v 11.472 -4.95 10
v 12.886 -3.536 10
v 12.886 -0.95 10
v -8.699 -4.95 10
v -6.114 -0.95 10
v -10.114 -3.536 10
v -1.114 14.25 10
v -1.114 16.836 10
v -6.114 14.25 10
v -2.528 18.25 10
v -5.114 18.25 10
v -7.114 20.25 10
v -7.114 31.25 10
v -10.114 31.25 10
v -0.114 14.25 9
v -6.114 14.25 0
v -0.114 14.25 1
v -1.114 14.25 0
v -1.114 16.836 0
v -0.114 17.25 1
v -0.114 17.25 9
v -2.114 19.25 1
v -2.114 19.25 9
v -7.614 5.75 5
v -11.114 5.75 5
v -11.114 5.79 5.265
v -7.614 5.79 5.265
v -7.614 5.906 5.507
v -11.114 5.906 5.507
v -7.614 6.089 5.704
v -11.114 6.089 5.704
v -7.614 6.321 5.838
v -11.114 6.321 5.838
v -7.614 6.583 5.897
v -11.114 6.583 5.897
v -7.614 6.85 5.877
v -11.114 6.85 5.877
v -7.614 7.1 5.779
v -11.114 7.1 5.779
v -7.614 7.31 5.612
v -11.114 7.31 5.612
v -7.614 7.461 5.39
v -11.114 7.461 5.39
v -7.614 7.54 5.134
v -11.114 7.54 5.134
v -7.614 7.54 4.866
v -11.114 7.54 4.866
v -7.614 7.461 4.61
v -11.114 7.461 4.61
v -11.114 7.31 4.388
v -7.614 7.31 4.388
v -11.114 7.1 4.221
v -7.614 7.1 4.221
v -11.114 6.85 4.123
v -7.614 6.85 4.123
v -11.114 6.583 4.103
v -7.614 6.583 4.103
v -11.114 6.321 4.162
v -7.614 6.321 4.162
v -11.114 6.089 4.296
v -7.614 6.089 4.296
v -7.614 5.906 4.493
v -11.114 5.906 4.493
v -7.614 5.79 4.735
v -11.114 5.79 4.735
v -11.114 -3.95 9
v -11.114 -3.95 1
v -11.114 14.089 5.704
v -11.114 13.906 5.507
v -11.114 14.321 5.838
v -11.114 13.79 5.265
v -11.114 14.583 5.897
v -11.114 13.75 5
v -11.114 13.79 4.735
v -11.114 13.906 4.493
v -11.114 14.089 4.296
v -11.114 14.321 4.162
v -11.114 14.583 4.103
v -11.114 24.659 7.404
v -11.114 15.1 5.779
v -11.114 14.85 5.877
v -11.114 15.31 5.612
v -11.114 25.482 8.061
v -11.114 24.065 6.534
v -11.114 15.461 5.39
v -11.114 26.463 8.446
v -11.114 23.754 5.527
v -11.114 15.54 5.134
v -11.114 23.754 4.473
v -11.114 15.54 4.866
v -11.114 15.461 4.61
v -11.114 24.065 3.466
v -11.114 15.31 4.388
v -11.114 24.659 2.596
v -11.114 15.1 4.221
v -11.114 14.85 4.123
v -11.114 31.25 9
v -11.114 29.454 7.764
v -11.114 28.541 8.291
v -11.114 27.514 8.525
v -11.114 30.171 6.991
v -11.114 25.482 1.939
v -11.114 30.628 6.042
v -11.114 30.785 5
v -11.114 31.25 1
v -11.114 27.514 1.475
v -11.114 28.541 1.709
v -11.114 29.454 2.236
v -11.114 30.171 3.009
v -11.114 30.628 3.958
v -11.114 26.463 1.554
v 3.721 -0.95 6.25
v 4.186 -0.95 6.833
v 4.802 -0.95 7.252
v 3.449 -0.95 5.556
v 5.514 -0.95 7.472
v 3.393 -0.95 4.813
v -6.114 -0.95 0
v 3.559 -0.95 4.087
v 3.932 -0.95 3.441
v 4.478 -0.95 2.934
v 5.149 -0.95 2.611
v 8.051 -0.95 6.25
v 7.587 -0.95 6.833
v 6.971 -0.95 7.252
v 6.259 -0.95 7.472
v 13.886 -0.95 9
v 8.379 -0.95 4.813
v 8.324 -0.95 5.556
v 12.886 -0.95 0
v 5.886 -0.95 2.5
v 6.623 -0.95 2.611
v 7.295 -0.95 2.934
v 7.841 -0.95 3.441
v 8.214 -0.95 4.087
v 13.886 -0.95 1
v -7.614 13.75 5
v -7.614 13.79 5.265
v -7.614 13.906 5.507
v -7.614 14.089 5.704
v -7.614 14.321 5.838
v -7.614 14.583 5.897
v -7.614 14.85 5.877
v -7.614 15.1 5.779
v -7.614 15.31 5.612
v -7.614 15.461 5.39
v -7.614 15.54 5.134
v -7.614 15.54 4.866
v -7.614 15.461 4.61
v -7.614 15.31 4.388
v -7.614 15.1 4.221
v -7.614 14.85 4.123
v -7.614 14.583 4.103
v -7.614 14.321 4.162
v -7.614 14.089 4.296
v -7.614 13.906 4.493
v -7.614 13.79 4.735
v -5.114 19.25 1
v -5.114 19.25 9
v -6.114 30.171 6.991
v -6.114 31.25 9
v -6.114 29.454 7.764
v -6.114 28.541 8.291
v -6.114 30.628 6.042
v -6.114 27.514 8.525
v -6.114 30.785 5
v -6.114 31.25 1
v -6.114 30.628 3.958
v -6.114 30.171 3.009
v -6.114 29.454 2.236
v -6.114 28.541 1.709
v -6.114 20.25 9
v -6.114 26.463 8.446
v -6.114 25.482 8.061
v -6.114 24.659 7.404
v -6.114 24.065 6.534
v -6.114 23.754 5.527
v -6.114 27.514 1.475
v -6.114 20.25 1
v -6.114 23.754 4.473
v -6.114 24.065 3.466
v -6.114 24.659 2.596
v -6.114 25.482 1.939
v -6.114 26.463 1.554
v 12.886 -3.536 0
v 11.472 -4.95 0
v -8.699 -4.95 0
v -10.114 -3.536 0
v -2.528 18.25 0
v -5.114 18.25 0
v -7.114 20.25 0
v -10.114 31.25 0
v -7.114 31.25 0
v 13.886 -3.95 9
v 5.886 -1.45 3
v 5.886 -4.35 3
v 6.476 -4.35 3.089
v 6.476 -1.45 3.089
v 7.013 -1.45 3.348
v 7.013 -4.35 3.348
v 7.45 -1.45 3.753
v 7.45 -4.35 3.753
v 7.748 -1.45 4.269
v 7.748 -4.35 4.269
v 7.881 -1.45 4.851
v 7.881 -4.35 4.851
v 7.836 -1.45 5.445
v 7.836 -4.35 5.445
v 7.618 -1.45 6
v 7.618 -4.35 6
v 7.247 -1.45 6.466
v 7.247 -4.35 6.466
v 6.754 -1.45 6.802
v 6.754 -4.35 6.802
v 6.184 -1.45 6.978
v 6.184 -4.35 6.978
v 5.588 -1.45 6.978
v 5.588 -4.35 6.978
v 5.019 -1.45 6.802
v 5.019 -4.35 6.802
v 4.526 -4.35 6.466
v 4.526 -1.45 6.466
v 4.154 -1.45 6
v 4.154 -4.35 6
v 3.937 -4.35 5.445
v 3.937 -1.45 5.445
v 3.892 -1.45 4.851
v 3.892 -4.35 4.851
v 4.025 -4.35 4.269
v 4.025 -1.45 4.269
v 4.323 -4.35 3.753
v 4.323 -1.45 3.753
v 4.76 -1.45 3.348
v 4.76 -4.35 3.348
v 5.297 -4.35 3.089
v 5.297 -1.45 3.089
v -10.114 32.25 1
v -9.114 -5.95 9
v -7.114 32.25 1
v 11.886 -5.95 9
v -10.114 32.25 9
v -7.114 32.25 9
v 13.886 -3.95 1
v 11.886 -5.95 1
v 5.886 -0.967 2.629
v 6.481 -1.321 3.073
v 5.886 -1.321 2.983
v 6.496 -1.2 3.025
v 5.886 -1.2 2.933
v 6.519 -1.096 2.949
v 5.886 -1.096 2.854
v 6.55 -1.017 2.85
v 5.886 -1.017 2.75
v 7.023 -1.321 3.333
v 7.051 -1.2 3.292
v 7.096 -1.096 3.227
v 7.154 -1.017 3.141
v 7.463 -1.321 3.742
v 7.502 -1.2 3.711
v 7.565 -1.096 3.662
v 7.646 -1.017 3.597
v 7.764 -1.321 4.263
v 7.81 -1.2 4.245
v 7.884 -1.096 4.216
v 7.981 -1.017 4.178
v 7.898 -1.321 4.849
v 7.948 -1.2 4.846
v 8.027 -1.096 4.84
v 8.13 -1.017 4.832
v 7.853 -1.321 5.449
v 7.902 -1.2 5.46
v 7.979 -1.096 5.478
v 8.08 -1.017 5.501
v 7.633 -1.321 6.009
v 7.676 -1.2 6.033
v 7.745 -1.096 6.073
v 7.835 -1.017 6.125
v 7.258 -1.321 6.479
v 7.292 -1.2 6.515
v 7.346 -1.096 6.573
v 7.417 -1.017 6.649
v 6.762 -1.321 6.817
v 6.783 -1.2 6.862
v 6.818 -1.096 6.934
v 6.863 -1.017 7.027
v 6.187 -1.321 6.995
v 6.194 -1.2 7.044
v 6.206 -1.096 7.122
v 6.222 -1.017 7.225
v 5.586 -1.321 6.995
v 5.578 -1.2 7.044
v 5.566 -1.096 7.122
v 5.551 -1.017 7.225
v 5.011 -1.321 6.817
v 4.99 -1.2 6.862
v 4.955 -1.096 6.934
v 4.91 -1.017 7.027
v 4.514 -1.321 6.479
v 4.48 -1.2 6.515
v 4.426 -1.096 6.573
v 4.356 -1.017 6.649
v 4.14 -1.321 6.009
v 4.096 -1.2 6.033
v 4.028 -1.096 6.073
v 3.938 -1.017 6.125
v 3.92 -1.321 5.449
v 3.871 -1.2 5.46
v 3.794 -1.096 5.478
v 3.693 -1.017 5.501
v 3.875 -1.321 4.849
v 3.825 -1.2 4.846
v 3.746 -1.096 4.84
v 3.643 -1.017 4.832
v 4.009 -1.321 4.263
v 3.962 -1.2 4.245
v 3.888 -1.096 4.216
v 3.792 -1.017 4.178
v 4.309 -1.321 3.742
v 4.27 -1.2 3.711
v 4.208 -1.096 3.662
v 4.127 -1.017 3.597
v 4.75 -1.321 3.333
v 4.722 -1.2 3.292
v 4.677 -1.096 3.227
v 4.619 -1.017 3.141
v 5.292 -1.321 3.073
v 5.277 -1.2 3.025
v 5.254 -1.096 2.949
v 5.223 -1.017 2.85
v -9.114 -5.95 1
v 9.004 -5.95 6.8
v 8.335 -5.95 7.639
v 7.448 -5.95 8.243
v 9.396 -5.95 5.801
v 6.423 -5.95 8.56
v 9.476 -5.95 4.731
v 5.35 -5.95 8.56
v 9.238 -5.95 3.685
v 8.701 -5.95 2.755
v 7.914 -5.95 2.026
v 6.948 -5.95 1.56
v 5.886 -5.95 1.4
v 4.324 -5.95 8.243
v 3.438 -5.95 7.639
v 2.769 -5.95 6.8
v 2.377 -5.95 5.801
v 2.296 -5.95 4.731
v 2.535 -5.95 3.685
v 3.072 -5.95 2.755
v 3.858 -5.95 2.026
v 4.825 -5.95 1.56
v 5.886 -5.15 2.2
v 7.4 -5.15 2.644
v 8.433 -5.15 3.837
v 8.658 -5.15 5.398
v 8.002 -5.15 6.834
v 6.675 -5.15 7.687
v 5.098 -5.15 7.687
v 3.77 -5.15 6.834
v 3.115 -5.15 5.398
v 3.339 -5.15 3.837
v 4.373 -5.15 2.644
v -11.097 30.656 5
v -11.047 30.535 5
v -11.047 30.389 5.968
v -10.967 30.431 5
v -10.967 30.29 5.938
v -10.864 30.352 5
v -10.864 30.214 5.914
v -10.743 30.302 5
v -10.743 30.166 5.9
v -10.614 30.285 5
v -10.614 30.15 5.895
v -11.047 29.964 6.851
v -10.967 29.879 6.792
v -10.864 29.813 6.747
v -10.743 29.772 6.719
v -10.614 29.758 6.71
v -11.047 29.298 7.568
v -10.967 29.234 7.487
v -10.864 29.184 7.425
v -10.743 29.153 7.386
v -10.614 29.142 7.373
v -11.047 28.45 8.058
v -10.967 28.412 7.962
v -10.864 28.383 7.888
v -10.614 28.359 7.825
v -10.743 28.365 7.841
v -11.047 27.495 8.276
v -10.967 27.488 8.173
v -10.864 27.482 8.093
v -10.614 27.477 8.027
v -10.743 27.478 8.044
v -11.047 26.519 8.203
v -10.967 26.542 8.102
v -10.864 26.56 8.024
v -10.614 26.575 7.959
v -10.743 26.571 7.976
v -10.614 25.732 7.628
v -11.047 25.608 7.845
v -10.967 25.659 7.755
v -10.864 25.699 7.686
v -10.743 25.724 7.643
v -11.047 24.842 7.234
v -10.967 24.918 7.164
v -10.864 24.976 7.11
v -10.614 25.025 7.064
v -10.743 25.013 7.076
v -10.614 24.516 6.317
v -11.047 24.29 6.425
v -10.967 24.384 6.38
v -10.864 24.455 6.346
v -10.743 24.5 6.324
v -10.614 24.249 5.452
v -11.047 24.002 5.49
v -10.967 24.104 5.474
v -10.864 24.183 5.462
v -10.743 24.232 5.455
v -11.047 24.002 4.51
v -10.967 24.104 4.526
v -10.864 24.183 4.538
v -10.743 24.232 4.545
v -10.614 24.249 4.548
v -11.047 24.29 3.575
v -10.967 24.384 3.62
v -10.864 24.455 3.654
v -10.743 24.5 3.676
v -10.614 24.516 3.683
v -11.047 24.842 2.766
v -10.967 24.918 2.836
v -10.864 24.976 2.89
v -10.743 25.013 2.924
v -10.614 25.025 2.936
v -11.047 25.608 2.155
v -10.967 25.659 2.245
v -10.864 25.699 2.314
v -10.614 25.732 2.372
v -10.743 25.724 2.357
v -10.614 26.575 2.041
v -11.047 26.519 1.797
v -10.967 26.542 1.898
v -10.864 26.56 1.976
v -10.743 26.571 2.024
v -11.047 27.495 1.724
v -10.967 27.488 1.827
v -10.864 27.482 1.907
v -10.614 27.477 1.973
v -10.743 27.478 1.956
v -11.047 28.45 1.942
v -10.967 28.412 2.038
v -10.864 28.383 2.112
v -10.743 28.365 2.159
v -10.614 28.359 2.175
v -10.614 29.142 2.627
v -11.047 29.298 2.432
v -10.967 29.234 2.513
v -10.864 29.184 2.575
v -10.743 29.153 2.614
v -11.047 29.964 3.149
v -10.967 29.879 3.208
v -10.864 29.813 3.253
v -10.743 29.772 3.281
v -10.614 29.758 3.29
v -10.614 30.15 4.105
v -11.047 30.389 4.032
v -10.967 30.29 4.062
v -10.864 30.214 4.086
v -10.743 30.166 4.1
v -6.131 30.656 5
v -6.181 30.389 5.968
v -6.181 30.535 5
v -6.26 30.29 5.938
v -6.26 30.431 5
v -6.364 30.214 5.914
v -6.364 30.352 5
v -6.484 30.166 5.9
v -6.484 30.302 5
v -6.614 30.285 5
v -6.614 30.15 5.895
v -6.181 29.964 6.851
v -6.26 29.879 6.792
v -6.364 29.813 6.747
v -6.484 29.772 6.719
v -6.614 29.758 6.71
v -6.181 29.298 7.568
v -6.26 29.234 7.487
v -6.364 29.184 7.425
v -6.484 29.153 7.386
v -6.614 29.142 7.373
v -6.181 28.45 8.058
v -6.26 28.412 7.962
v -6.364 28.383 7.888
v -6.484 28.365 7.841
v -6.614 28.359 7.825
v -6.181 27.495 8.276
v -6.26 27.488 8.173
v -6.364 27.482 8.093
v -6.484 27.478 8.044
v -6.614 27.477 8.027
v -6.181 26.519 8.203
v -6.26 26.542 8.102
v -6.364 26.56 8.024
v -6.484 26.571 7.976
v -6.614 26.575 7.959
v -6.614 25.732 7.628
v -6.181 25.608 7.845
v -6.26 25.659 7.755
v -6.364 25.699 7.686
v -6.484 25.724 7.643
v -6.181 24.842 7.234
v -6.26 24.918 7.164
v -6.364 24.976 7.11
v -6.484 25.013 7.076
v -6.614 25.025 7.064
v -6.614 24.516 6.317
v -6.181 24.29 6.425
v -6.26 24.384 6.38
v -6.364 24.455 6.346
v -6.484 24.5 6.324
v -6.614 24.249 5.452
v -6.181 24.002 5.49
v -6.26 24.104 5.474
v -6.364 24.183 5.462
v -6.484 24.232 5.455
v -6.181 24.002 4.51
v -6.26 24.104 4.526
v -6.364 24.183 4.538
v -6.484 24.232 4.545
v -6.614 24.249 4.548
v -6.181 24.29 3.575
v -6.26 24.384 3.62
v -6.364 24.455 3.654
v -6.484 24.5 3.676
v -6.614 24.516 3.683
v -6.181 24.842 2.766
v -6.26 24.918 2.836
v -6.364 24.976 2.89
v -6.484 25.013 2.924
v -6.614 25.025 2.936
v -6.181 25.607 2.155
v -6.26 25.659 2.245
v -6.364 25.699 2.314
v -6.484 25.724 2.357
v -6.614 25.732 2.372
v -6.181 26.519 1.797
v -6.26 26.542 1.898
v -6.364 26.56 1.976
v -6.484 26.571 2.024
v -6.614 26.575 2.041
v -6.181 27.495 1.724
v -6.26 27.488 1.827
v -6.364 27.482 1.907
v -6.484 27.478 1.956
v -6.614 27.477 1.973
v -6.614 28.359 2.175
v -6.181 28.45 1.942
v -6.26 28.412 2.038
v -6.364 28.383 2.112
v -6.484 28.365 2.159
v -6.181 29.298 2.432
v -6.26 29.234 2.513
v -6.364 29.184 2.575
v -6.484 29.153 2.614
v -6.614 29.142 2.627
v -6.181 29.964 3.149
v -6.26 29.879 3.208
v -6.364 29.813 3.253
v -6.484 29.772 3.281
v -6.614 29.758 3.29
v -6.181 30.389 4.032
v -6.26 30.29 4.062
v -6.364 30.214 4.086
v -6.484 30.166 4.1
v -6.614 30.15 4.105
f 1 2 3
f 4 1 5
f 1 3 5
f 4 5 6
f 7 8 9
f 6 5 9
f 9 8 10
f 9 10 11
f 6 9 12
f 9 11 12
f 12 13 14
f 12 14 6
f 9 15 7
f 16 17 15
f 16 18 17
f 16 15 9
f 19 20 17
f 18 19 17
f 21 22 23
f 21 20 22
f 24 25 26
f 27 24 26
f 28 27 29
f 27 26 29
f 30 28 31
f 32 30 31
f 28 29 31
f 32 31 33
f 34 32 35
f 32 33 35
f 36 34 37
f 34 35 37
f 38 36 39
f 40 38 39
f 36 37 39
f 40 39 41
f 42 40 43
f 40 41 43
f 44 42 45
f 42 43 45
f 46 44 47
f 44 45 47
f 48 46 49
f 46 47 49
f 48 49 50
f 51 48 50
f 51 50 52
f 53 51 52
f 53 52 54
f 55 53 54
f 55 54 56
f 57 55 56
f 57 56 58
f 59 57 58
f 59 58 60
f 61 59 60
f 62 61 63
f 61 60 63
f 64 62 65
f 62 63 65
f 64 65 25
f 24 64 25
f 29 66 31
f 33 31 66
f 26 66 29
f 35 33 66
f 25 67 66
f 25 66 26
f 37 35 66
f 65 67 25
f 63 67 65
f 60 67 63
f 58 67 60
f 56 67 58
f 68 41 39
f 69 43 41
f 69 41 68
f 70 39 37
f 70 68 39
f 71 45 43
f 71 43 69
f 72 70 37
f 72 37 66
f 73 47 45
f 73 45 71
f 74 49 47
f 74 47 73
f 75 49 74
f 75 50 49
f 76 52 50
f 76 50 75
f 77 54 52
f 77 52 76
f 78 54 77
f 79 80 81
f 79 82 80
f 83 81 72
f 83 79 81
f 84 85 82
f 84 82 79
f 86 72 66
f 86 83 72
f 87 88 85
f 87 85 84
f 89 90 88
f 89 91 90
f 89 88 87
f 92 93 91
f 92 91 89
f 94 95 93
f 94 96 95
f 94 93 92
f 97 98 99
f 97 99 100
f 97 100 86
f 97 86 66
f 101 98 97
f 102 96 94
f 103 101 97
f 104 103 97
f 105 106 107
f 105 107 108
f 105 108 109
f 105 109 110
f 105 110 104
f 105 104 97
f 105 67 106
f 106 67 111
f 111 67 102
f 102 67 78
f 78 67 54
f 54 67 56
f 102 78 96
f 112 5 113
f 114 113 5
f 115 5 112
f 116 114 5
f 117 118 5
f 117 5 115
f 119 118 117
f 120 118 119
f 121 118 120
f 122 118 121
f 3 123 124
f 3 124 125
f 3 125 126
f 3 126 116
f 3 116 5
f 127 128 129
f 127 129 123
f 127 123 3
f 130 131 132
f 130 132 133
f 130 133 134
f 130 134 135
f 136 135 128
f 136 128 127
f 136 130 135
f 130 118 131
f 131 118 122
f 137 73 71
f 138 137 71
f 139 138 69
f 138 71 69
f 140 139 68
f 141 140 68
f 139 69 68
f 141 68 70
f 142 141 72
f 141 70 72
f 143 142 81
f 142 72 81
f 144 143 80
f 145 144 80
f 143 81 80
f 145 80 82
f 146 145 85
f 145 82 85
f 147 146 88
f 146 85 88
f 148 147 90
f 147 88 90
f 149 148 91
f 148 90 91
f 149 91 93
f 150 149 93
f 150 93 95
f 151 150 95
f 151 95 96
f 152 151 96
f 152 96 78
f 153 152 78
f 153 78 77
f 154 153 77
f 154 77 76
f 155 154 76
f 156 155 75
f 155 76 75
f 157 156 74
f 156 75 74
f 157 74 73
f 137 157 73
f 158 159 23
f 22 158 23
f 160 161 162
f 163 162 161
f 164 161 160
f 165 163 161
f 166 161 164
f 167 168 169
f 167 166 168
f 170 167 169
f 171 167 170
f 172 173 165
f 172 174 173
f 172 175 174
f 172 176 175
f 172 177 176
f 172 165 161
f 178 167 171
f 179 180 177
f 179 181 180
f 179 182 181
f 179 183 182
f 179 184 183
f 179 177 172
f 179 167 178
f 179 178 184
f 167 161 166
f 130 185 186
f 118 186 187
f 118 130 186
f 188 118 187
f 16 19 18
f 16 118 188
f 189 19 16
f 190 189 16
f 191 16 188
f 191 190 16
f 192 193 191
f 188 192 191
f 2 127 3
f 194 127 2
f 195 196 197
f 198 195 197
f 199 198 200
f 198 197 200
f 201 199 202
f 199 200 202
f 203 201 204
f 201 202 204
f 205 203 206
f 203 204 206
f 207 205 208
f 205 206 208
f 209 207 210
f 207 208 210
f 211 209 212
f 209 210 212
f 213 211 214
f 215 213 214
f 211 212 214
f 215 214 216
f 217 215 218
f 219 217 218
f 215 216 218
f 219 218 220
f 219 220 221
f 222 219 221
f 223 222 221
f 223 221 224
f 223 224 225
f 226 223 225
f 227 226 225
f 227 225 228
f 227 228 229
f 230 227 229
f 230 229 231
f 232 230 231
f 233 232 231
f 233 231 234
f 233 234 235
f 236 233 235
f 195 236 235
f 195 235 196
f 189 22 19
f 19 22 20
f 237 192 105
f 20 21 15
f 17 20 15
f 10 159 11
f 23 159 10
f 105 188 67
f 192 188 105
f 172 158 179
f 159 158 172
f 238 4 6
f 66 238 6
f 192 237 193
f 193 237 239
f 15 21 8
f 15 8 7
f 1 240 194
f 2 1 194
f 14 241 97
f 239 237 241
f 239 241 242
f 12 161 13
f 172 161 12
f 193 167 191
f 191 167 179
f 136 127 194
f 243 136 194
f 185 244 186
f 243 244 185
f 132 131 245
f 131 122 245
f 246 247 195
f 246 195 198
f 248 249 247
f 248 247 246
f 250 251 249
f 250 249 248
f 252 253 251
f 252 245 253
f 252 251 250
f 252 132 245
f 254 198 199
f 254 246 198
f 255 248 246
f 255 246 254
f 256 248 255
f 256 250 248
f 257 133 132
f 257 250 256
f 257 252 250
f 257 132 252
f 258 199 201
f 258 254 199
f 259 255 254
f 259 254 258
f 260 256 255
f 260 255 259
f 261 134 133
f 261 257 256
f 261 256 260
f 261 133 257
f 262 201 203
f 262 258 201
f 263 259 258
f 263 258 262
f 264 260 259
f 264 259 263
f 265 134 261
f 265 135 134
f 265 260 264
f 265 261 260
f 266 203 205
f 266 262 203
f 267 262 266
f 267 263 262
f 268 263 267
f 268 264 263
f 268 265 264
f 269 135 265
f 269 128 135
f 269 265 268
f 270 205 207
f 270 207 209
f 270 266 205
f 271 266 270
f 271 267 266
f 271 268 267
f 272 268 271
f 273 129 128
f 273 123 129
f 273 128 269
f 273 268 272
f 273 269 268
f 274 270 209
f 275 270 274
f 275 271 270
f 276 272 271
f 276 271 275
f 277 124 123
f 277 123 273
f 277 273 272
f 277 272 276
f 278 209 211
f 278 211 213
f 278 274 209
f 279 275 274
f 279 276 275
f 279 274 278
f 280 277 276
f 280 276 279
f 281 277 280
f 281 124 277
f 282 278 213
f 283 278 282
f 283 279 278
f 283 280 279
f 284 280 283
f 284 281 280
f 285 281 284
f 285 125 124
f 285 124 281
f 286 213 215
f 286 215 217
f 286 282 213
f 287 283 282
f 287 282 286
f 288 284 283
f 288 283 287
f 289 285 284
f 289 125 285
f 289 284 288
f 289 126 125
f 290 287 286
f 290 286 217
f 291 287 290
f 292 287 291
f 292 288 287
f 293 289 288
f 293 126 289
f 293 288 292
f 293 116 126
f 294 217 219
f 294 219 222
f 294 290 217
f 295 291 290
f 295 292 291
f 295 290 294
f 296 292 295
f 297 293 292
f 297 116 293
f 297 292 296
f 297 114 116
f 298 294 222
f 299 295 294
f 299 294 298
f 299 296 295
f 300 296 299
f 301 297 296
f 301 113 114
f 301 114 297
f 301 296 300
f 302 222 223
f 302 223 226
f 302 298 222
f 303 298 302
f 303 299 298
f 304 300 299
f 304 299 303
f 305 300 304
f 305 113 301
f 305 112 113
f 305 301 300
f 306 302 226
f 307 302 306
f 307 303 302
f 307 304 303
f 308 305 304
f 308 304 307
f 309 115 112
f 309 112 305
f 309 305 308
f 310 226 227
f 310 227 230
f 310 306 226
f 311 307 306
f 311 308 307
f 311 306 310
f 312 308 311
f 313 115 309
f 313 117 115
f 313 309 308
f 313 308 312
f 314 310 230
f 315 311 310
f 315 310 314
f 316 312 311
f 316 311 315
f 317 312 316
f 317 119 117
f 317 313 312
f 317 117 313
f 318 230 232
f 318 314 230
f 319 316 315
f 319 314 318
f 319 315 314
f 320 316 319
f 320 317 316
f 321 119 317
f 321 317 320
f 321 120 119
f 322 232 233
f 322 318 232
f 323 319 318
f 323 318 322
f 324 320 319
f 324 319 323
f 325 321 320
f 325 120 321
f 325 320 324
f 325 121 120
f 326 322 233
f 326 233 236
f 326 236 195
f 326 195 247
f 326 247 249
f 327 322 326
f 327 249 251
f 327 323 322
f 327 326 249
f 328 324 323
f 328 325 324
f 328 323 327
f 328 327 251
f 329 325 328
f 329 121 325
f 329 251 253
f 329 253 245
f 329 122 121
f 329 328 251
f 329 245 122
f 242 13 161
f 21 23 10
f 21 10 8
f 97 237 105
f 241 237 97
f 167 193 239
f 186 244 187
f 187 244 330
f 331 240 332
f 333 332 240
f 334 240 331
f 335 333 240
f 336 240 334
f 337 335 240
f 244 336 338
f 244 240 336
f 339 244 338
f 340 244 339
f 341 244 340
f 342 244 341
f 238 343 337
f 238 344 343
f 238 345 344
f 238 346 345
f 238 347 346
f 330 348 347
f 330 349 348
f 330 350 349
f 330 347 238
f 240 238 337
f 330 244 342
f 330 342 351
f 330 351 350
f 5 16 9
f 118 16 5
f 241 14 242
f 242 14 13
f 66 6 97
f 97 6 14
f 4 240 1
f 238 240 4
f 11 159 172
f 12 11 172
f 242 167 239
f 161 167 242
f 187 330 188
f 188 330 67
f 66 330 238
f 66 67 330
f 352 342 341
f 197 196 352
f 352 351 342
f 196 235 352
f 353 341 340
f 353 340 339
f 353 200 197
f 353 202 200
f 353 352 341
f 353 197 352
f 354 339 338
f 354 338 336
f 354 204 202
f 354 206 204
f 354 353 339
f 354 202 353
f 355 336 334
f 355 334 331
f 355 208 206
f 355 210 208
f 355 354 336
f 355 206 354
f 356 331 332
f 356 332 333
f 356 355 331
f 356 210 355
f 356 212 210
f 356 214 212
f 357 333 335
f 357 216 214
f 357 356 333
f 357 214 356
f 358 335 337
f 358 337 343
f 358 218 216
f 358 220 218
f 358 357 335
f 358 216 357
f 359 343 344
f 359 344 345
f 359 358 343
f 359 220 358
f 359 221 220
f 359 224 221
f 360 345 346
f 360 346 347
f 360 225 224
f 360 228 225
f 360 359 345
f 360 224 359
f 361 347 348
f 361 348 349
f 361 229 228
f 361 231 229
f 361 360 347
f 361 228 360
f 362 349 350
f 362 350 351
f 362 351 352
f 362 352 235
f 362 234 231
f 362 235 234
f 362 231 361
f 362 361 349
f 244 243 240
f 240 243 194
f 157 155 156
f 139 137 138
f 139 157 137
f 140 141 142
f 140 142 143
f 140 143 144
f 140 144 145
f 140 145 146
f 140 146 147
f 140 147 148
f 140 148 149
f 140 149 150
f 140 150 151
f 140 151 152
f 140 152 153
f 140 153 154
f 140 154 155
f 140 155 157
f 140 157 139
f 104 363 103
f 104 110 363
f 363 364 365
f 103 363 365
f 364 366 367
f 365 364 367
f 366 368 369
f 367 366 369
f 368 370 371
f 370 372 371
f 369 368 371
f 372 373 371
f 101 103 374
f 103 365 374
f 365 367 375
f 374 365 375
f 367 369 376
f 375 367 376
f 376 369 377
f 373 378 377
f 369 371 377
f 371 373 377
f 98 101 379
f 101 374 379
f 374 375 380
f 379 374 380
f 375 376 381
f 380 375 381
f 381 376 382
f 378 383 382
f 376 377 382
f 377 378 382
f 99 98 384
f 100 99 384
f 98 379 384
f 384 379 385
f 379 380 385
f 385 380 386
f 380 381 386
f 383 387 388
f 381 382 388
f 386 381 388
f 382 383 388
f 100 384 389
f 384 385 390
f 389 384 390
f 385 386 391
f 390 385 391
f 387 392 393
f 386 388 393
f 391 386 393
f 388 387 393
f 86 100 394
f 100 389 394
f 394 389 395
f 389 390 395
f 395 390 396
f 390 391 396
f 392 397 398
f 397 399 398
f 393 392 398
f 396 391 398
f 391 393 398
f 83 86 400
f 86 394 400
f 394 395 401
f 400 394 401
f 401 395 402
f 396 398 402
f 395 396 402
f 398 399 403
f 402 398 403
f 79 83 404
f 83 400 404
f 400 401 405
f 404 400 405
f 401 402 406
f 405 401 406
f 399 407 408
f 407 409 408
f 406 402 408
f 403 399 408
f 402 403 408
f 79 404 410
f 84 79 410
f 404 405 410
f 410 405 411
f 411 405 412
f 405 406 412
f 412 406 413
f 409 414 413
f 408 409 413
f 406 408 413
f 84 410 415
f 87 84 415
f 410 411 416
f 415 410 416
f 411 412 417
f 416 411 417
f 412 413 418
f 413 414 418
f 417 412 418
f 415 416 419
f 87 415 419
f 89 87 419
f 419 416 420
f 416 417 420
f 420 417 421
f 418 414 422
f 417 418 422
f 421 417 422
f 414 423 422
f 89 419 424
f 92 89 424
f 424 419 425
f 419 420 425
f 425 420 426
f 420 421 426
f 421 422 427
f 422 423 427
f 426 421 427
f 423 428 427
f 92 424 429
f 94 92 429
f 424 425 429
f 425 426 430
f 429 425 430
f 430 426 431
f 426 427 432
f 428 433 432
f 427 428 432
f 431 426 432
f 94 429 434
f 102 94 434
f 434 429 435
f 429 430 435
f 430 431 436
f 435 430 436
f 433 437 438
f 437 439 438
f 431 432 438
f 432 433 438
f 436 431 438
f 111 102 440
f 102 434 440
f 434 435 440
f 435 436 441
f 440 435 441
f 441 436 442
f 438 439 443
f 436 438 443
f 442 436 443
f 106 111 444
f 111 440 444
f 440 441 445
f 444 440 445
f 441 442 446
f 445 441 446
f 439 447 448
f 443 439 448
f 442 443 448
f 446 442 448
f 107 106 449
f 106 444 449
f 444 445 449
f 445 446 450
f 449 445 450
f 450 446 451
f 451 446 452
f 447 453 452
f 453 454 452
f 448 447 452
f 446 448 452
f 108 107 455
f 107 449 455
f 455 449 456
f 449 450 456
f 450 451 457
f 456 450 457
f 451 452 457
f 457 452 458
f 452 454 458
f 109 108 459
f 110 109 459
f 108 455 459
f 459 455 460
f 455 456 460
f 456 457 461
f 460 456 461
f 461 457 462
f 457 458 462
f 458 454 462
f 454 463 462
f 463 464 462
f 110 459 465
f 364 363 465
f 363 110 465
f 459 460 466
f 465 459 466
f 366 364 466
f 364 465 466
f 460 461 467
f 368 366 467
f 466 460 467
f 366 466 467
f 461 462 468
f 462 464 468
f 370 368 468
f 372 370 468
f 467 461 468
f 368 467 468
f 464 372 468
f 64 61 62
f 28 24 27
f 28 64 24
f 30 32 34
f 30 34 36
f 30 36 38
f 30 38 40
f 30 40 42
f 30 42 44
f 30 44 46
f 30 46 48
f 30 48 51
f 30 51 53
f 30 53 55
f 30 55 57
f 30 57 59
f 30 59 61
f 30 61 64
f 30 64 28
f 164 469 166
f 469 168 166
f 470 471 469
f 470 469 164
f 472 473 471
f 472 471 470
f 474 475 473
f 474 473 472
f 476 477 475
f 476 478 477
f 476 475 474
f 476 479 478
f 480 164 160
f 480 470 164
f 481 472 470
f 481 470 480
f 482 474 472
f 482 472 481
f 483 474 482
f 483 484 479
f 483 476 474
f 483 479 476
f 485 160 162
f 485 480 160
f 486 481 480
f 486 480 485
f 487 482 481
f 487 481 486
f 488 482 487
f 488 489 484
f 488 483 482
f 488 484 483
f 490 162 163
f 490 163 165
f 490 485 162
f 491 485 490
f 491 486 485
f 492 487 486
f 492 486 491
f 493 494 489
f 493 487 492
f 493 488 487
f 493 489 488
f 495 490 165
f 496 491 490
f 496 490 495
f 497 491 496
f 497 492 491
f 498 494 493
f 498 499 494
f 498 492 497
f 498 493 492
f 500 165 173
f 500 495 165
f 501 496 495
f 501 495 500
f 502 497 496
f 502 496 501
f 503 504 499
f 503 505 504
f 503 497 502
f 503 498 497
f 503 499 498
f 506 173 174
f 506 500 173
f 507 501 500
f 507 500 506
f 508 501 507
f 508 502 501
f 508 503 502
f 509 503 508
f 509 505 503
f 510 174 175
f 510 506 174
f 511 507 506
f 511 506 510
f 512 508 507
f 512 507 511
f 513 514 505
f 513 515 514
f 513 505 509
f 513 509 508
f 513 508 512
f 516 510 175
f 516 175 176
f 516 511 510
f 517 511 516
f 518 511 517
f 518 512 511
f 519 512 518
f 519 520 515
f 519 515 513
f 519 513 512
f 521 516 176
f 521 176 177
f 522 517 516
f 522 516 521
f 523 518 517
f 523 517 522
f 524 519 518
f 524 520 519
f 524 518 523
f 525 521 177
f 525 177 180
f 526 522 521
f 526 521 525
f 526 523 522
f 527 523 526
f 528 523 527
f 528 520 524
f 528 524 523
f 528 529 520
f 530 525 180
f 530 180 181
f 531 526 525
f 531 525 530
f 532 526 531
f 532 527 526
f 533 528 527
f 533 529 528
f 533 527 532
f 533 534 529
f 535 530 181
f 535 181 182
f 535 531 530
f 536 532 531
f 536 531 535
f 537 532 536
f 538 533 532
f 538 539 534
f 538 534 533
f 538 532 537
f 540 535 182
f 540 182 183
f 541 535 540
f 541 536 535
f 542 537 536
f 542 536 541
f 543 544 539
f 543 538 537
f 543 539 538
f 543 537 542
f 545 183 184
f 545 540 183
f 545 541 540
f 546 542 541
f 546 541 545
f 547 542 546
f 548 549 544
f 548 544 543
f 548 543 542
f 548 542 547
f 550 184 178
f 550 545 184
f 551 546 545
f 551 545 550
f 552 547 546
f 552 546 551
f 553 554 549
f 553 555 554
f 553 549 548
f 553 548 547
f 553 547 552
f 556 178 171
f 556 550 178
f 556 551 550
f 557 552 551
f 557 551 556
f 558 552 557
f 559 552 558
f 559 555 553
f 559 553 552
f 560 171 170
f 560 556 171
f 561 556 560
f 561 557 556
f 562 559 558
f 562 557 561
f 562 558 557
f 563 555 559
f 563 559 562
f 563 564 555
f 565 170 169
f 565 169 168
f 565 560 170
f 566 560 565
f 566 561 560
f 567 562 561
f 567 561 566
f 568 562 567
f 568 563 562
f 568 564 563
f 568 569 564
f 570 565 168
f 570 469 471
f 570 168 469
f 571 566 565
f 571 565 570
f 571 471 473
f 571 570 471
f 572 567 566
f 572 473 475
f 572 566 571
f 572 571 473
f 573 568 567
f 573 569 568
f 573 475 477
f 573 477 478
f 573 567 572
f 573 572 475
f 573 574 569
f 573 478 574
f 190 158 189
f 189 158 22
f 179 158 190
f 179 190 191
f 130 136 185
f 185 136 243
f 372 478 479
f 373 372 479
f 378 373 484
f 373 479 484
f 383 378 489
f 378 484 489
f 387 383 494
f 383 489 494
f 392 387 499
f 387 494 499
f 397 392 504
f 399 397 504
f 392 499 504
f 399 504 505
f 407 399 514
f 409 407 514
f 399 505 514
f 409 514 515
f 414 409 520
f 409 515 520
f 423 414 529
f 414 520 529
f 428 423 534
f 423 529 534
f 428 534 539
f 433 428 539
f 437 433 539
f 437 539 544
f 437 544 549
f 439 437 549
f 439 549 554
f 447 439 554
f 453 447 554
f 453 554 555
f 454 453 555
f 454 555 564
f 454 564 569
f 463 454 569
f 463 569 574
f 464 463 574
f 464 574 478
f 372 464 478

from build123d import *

# Parameters (mm, degrees)
RESSALTO_EXTRUS_O1_DEPTH = 10
ESBO_O3_R                = 2
CORTE_EXTRUS_O1_DEPTH    = 15
CHANFRO1_SIZE            = 1.6
FILETE1_R                = 0.5
CHANFRO5_SIZE            = 2
ESBO_O4_R                = 3.035
CORTE_EXTRUS_O2_DEPTH    = 10
FILETE2_R                = 0.5
CHANFRO6_SIZE            = 1
ESBO_O6_R                = 0.9
CORTE_EXTRUS_O3_DEPTH    = 3.5


with BuildPart() as part:
    # Esboço1 → Ressalto-extrusão1 (new body)
    with BuildSketch(Plane.XY):
        Polygon((-0.113617837, 14.25), (-6.113617837, 14.25), (-6.113617837, -0.95), (13.886382163, -0.95), (13.886382163, -5.95), (-11.113617837, -5.95), (-11.113617837, 32.25), (-6.113617837, 32.25), (-6.113617837, 19.25), (-0.113617837, 19.25), align=None)
    extrude(amount=RESSALTO_EXTRUS_O1_DEPTH)

    # Esboço3 → Corte-extrusão1 (cut)
    with BuildSketch(Plane.XZ.offset(5.95)):
        with Locations(Location((5.886382163, 5, 0), (0, 0, 270))):
            Circle(ESBO_O3_R)
    extrude(amount=-CORTE_EXTRUS_O1_DEPTH, mode=Mode.SUBTRACT)

    # Chanfro1
    chanfro1_edges = [part.edges().sort_by_distance(p)[0] for p in [
        (5.886382163, -5.95, 7),
    ]]
    chamfer(chanfro1_edges, length=CHANFRO1_SIZE)

    # Filete1
    filete1_edges = [part.edges().sort_by_distance(p)[0] for p in [
        (5.886382163, -0.95, 7),
    ]]
    fillet(filete1_edges, radius=FILETE1_R)

    # Chanfro5
    chanfro5_edges = [part.edges().sort_by_distance(p)[0] for p in [
        (13.886382163, -5.95, 5),
        (-11.113617837, -5.95, 5),
        (-0.113617837, 19.25, 5),
    ]]
    chamfer(chanfro5_edges, length=CHANFRO5_SIZE)

    # Esboço4 → Corte-extrusão2 (cut)
    with BuildSketch(Plane(origin=(-6.113617837, 0, 0), x_dir=(0, 0, -1), z_dir=(1, 0, 0))):
        with Locations(Location((-5, 27.25, 0), (0, 0, 90))):
            Circle(ESBO_O4_R)
    extrude(amount=-CORTE_EXTRUS_O2_DEPTH, mode=Mode.SUBTRACT)

    # Filete2
    filete2_edges = [part.edges().sort_by_distance(p)[0] for p in [
        (-11.113617837, 24.215, 5),
        (-6.113617837, 24.215, 5),
    ]]
    fillet(filete2_edges, radius=FILETE2_R)

    # Chanfro6
    chanfro6_edges = [part.edges().sort_by_distance(p)[0] for p in [
        (-11.113617837, 14.15, 0),
        (-8.613617837, 32.25, 0),
        (-6.113617837, 25.75, 10),
        (-6.113617837, 25.75, 0),
        (-0.113617837, 15.75, 0),
        (-8.613617837, 32.25, 10),
        (-11.113617837, 32.25, 5),
        (-6.113617837, 32.25, 5),
        (-6.113617837, 19.25, 5),
        (-11.113617837, 14.15, 10),
        (-4.113617837, 19.25, 0),
        (-4.113617837, 19.25, 10),
        (13.886382163, -2.45, 0),
        (1.386382163, -5.95, 0),
        (12.886382163, -4.95, 0),
        (-10.113617837, -4.95, 0),
        (-1.113617837, 18.25, 0),
        (1.386382163, -5.95, 10),
        (-0.113617837, 15.75, 10),
        (13.886382163, -2.45, 10),
        (12.886382163, -4.95, 10),
        (-10.113617837, -4.95, 10),
        (-1.113617837, 18.25, 10),
    ]]
    chamfer(chanfro6_edges, length=CHANFRO6_SIZE)

    # Esboço6 → Corte-extrusão3 (cut)
    with BuildSketch(Plane.ZY.offset(11.113617837)):
        with Locations(Location((5, 6.65, 0), (0, 0, 270))):
            Circle(ESBO_O6_R)
        with Locations(Location((5, 14.65, 0), (0, 0, 270))):
            Circle(ESBO_O6_R)
    extrude(amount=-CORTE_EXTRUS_O3_DEPTH, mode=Mode.SUBTRACT)


solid = part.part
